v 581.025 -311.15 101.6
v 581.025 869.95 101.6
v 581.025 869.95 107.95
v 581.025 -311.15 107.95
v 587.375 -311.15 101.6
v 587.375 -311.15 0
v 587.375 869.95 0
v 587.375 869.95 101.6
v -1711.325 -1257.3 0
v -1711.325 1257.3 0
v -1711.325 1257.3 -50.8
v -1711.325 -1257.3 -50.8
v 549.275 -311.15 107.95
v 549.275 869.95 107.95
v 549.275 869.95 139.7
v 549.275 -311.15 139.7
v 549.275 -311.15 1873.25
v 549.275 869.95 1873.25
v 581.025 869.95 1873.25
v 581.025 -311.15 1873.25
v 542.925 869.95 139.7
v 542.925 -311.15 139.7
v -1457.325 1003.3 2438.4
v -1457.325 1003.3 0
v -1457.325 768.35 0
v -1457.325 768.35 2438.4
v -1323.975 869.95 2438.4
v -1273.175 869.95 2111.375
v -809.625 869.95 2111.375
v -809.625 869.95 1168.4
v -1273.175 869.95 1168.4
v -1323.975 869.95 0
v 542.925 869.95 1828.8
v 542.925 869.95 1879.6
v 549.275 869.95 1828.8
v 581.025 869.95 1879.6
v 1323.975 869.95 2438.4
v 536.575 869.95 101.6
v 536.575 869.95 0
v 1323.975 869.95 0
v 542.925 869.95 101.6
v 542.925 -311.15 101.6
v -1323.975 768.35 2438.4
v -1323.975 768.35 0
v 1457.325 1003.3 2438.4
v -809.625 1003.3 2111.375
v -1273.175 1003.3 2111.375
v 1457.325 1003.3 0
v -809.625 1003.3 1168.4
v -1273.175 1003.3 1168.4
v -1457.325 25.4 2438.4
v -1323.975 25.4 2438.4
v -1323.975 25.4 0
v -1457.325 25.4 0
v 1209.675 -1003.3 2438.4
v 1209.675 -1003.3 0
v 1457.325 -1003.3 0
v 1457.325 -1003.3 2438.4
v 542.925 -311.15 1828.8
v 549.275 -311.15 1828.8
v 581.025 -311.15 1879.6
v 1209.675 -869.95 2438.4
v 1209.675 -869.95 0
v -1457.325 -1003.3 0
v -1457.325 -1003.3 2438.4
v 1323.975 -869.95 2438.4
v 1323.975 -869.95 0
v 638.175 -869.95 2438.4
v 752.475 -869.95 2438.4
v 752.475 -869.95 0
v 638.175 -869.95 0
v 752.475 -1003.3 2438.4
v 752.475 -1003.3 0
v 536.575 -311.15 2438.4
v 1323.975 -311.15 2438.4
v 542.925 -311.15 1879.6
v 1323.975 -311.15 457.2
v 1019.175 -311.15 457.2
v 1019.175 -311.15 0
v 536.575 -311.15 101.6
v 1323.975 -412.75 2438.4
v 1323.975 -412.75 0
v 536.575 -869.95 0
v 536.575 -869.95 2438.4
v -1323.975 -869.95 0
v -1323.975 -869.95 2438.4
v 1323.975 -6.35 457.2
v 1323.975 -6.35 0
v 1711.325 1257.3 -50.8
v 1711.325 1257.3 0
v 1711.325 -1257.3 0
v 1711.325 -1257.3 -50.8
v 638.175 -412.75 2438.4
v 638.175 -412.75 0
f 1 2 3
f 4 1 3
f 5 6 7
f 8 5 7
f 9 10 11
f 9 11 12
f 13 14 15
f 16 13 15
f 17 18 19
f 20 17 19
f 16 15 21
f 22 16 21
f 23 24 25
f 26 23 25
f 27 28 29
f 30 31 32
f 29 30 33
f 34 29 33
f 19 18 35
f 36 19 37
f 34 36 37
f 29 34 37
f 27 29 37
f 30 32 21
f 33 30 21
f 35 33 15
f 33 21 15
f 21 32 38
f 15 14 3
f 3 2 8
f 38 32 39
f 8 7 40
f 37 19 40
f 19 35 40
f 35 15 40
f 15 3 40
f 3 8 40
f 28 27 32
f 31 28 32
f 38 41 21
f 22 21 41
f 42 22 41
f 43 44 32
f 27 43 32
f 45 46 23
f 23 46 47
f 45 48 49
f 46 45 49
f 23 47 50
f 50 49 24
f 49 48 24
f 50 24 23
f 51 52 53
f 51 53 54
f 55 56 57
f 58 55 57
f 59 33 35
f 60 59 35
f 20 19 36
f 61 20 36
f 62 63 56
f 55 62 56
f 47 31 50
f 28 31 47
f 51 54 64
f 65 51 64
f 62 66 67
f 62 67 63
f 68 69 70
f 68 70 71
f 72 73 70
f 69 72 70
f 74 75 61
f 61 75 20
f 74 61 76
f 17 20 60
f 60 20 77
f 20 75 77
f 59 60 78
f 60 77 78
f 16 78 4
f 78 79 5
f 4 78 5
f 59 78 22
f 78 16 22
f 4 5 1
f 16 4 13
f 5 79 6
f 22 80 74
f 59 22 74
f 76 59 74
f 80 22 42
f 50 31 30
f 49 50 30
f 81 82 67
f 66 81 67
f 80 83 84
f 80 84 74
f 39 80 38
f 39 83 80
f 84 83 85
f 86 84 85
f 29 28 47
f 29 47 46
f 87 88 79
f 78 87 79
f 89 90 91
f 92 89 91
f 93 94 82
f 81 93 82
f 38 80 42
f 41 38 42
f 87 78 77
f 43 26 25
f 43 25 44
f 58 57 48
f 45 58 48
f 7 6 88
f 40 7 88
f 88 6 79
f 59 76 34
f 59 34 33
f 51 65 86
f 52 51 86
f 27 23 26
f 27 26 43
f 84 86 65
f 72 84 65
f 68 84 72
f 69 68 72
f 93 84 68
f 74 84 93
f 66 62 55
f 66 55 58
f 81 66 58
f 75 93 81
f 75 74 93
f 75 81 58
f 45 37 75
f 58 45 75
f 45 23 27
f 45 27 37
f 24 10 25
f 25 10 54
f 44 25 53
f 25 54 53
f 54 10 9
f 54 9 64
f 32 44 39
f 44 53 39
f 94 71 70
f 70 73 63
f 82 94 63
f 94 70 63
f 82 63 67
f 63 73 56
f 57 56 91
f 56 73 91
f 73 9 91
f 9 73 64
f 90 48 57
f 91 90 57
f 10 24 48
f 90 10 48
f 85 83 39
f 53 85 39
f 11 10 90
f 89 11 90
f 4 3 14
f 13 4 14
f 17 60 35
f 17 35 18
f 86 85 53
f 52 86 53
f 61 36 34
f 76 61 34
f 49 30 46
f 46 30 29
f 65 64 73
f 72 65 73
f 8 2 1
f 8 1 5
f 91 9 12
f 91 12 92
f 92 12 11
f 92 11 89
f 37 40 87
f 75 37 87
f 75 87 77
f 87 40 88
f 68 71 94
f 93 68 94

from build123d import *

# Parameters (mm, degrees)
F1_DEPTH  = 2438.4
F4_W      = 463.55
F4_H      = 942.975
F5_DEPTH  = 133.351
F6_W      = 3422.65
F6_H      = 2514.6
F7_DEPTH  = 50.8
F0_W      = 50.8
F0_H      = 1181.1
F8_DEPTH  = 101.6
F10_DEPTH = 1181.1
F12_DEPTH = 457.2


with BuildPart() as f1:
    # F0 (on Top) → F1 (new body)
    with BuildSketch(Plane.XY):
        Polygon((752.475, -1003.3), (752.475, -869.95), (638.175, -869.95), (536.575, -869.95), (-1323.975, -869.95), (-1323.975, 25.4), (-1457.325, 25.4), (-1457.325, -1003.3), align=None)
        Polygon((1323.975, -412.75), (1323.975, -869.95), (1209.675, -869.95), (1209.675, -1003.3), (1457.325, -1003.3), (1457.325, 1003.3), (-1457.325, 1003.3), (-1457.325, 768.35), (-1323.975, 768.35), (-1323.975, 869.95), (536.575, 869.95), (587.375, 869.95), (1323.975, 869.95), (1323.975, -311.15), align=None)
        Polygon((638.175, -412.75), (1323.975, -412.75), (1323.975, -311.15), (587.375, -311.15), (536.575, -311.15), (536.575, -869.95), (638.175, -869.95), align=None)
    extrude(amount=F1_DEPTH)

    # F4 (on face) → F5 (cut, through all)
    with BuildSketch(Plane.XZ.offset(-869.95)):
        with Locations((-1041.4, 1639.8875)):
            Rectangle(F4_W, F4_H)
    extrude(amount=-F5_DEPTH, mode=Mode.SUBTRACT)

    # F6 (on face) → F7 (join)
    with BuildSketch(Plane(origin=(0, 0, 0), x_dir=(1, 0, 0), z_dir=(0, 0, -1))):
        Rectangle(F6_W, F6_H)
    extrude(amount=F7_DEPTH)

    # F0 (on Top) → F8 (join)
    with BuildSketch(Plane.XY):
        with Locations((561.975, 279.4)):
            Rectangle(F0_W, F0_H)
    extrude(amount=F8_DEPTH)

    # F9 (on face) → F10 (join, through all)
    with BuildSketch(Plane.XZ.offset(-869.95)):
        Polygon((542.925, 139.7), (542.925, 101.6), (581.025, 101.6), (581.025, 107.95), (549.275, 107.95), (549.275, 139.7), align=None)
        Polygon((581.025, 1879.6), (542.925, 1879.6), (542.925, 1828.8), (549.275, 1828.8), (549.275, 1873.25), (581.025, 1873.25), align=None)
    extrude(amount=F10_DEPTH)

    # F11 (on face) → F12 (join)
    with BuildSketch(Plane.XY):
        Polygon((1323.975, -6.35), (1019.175, -311.15), (1323.975, -311.15), align=None)
    extrude(amount=F12_DEPTH)


solid = f1.part
